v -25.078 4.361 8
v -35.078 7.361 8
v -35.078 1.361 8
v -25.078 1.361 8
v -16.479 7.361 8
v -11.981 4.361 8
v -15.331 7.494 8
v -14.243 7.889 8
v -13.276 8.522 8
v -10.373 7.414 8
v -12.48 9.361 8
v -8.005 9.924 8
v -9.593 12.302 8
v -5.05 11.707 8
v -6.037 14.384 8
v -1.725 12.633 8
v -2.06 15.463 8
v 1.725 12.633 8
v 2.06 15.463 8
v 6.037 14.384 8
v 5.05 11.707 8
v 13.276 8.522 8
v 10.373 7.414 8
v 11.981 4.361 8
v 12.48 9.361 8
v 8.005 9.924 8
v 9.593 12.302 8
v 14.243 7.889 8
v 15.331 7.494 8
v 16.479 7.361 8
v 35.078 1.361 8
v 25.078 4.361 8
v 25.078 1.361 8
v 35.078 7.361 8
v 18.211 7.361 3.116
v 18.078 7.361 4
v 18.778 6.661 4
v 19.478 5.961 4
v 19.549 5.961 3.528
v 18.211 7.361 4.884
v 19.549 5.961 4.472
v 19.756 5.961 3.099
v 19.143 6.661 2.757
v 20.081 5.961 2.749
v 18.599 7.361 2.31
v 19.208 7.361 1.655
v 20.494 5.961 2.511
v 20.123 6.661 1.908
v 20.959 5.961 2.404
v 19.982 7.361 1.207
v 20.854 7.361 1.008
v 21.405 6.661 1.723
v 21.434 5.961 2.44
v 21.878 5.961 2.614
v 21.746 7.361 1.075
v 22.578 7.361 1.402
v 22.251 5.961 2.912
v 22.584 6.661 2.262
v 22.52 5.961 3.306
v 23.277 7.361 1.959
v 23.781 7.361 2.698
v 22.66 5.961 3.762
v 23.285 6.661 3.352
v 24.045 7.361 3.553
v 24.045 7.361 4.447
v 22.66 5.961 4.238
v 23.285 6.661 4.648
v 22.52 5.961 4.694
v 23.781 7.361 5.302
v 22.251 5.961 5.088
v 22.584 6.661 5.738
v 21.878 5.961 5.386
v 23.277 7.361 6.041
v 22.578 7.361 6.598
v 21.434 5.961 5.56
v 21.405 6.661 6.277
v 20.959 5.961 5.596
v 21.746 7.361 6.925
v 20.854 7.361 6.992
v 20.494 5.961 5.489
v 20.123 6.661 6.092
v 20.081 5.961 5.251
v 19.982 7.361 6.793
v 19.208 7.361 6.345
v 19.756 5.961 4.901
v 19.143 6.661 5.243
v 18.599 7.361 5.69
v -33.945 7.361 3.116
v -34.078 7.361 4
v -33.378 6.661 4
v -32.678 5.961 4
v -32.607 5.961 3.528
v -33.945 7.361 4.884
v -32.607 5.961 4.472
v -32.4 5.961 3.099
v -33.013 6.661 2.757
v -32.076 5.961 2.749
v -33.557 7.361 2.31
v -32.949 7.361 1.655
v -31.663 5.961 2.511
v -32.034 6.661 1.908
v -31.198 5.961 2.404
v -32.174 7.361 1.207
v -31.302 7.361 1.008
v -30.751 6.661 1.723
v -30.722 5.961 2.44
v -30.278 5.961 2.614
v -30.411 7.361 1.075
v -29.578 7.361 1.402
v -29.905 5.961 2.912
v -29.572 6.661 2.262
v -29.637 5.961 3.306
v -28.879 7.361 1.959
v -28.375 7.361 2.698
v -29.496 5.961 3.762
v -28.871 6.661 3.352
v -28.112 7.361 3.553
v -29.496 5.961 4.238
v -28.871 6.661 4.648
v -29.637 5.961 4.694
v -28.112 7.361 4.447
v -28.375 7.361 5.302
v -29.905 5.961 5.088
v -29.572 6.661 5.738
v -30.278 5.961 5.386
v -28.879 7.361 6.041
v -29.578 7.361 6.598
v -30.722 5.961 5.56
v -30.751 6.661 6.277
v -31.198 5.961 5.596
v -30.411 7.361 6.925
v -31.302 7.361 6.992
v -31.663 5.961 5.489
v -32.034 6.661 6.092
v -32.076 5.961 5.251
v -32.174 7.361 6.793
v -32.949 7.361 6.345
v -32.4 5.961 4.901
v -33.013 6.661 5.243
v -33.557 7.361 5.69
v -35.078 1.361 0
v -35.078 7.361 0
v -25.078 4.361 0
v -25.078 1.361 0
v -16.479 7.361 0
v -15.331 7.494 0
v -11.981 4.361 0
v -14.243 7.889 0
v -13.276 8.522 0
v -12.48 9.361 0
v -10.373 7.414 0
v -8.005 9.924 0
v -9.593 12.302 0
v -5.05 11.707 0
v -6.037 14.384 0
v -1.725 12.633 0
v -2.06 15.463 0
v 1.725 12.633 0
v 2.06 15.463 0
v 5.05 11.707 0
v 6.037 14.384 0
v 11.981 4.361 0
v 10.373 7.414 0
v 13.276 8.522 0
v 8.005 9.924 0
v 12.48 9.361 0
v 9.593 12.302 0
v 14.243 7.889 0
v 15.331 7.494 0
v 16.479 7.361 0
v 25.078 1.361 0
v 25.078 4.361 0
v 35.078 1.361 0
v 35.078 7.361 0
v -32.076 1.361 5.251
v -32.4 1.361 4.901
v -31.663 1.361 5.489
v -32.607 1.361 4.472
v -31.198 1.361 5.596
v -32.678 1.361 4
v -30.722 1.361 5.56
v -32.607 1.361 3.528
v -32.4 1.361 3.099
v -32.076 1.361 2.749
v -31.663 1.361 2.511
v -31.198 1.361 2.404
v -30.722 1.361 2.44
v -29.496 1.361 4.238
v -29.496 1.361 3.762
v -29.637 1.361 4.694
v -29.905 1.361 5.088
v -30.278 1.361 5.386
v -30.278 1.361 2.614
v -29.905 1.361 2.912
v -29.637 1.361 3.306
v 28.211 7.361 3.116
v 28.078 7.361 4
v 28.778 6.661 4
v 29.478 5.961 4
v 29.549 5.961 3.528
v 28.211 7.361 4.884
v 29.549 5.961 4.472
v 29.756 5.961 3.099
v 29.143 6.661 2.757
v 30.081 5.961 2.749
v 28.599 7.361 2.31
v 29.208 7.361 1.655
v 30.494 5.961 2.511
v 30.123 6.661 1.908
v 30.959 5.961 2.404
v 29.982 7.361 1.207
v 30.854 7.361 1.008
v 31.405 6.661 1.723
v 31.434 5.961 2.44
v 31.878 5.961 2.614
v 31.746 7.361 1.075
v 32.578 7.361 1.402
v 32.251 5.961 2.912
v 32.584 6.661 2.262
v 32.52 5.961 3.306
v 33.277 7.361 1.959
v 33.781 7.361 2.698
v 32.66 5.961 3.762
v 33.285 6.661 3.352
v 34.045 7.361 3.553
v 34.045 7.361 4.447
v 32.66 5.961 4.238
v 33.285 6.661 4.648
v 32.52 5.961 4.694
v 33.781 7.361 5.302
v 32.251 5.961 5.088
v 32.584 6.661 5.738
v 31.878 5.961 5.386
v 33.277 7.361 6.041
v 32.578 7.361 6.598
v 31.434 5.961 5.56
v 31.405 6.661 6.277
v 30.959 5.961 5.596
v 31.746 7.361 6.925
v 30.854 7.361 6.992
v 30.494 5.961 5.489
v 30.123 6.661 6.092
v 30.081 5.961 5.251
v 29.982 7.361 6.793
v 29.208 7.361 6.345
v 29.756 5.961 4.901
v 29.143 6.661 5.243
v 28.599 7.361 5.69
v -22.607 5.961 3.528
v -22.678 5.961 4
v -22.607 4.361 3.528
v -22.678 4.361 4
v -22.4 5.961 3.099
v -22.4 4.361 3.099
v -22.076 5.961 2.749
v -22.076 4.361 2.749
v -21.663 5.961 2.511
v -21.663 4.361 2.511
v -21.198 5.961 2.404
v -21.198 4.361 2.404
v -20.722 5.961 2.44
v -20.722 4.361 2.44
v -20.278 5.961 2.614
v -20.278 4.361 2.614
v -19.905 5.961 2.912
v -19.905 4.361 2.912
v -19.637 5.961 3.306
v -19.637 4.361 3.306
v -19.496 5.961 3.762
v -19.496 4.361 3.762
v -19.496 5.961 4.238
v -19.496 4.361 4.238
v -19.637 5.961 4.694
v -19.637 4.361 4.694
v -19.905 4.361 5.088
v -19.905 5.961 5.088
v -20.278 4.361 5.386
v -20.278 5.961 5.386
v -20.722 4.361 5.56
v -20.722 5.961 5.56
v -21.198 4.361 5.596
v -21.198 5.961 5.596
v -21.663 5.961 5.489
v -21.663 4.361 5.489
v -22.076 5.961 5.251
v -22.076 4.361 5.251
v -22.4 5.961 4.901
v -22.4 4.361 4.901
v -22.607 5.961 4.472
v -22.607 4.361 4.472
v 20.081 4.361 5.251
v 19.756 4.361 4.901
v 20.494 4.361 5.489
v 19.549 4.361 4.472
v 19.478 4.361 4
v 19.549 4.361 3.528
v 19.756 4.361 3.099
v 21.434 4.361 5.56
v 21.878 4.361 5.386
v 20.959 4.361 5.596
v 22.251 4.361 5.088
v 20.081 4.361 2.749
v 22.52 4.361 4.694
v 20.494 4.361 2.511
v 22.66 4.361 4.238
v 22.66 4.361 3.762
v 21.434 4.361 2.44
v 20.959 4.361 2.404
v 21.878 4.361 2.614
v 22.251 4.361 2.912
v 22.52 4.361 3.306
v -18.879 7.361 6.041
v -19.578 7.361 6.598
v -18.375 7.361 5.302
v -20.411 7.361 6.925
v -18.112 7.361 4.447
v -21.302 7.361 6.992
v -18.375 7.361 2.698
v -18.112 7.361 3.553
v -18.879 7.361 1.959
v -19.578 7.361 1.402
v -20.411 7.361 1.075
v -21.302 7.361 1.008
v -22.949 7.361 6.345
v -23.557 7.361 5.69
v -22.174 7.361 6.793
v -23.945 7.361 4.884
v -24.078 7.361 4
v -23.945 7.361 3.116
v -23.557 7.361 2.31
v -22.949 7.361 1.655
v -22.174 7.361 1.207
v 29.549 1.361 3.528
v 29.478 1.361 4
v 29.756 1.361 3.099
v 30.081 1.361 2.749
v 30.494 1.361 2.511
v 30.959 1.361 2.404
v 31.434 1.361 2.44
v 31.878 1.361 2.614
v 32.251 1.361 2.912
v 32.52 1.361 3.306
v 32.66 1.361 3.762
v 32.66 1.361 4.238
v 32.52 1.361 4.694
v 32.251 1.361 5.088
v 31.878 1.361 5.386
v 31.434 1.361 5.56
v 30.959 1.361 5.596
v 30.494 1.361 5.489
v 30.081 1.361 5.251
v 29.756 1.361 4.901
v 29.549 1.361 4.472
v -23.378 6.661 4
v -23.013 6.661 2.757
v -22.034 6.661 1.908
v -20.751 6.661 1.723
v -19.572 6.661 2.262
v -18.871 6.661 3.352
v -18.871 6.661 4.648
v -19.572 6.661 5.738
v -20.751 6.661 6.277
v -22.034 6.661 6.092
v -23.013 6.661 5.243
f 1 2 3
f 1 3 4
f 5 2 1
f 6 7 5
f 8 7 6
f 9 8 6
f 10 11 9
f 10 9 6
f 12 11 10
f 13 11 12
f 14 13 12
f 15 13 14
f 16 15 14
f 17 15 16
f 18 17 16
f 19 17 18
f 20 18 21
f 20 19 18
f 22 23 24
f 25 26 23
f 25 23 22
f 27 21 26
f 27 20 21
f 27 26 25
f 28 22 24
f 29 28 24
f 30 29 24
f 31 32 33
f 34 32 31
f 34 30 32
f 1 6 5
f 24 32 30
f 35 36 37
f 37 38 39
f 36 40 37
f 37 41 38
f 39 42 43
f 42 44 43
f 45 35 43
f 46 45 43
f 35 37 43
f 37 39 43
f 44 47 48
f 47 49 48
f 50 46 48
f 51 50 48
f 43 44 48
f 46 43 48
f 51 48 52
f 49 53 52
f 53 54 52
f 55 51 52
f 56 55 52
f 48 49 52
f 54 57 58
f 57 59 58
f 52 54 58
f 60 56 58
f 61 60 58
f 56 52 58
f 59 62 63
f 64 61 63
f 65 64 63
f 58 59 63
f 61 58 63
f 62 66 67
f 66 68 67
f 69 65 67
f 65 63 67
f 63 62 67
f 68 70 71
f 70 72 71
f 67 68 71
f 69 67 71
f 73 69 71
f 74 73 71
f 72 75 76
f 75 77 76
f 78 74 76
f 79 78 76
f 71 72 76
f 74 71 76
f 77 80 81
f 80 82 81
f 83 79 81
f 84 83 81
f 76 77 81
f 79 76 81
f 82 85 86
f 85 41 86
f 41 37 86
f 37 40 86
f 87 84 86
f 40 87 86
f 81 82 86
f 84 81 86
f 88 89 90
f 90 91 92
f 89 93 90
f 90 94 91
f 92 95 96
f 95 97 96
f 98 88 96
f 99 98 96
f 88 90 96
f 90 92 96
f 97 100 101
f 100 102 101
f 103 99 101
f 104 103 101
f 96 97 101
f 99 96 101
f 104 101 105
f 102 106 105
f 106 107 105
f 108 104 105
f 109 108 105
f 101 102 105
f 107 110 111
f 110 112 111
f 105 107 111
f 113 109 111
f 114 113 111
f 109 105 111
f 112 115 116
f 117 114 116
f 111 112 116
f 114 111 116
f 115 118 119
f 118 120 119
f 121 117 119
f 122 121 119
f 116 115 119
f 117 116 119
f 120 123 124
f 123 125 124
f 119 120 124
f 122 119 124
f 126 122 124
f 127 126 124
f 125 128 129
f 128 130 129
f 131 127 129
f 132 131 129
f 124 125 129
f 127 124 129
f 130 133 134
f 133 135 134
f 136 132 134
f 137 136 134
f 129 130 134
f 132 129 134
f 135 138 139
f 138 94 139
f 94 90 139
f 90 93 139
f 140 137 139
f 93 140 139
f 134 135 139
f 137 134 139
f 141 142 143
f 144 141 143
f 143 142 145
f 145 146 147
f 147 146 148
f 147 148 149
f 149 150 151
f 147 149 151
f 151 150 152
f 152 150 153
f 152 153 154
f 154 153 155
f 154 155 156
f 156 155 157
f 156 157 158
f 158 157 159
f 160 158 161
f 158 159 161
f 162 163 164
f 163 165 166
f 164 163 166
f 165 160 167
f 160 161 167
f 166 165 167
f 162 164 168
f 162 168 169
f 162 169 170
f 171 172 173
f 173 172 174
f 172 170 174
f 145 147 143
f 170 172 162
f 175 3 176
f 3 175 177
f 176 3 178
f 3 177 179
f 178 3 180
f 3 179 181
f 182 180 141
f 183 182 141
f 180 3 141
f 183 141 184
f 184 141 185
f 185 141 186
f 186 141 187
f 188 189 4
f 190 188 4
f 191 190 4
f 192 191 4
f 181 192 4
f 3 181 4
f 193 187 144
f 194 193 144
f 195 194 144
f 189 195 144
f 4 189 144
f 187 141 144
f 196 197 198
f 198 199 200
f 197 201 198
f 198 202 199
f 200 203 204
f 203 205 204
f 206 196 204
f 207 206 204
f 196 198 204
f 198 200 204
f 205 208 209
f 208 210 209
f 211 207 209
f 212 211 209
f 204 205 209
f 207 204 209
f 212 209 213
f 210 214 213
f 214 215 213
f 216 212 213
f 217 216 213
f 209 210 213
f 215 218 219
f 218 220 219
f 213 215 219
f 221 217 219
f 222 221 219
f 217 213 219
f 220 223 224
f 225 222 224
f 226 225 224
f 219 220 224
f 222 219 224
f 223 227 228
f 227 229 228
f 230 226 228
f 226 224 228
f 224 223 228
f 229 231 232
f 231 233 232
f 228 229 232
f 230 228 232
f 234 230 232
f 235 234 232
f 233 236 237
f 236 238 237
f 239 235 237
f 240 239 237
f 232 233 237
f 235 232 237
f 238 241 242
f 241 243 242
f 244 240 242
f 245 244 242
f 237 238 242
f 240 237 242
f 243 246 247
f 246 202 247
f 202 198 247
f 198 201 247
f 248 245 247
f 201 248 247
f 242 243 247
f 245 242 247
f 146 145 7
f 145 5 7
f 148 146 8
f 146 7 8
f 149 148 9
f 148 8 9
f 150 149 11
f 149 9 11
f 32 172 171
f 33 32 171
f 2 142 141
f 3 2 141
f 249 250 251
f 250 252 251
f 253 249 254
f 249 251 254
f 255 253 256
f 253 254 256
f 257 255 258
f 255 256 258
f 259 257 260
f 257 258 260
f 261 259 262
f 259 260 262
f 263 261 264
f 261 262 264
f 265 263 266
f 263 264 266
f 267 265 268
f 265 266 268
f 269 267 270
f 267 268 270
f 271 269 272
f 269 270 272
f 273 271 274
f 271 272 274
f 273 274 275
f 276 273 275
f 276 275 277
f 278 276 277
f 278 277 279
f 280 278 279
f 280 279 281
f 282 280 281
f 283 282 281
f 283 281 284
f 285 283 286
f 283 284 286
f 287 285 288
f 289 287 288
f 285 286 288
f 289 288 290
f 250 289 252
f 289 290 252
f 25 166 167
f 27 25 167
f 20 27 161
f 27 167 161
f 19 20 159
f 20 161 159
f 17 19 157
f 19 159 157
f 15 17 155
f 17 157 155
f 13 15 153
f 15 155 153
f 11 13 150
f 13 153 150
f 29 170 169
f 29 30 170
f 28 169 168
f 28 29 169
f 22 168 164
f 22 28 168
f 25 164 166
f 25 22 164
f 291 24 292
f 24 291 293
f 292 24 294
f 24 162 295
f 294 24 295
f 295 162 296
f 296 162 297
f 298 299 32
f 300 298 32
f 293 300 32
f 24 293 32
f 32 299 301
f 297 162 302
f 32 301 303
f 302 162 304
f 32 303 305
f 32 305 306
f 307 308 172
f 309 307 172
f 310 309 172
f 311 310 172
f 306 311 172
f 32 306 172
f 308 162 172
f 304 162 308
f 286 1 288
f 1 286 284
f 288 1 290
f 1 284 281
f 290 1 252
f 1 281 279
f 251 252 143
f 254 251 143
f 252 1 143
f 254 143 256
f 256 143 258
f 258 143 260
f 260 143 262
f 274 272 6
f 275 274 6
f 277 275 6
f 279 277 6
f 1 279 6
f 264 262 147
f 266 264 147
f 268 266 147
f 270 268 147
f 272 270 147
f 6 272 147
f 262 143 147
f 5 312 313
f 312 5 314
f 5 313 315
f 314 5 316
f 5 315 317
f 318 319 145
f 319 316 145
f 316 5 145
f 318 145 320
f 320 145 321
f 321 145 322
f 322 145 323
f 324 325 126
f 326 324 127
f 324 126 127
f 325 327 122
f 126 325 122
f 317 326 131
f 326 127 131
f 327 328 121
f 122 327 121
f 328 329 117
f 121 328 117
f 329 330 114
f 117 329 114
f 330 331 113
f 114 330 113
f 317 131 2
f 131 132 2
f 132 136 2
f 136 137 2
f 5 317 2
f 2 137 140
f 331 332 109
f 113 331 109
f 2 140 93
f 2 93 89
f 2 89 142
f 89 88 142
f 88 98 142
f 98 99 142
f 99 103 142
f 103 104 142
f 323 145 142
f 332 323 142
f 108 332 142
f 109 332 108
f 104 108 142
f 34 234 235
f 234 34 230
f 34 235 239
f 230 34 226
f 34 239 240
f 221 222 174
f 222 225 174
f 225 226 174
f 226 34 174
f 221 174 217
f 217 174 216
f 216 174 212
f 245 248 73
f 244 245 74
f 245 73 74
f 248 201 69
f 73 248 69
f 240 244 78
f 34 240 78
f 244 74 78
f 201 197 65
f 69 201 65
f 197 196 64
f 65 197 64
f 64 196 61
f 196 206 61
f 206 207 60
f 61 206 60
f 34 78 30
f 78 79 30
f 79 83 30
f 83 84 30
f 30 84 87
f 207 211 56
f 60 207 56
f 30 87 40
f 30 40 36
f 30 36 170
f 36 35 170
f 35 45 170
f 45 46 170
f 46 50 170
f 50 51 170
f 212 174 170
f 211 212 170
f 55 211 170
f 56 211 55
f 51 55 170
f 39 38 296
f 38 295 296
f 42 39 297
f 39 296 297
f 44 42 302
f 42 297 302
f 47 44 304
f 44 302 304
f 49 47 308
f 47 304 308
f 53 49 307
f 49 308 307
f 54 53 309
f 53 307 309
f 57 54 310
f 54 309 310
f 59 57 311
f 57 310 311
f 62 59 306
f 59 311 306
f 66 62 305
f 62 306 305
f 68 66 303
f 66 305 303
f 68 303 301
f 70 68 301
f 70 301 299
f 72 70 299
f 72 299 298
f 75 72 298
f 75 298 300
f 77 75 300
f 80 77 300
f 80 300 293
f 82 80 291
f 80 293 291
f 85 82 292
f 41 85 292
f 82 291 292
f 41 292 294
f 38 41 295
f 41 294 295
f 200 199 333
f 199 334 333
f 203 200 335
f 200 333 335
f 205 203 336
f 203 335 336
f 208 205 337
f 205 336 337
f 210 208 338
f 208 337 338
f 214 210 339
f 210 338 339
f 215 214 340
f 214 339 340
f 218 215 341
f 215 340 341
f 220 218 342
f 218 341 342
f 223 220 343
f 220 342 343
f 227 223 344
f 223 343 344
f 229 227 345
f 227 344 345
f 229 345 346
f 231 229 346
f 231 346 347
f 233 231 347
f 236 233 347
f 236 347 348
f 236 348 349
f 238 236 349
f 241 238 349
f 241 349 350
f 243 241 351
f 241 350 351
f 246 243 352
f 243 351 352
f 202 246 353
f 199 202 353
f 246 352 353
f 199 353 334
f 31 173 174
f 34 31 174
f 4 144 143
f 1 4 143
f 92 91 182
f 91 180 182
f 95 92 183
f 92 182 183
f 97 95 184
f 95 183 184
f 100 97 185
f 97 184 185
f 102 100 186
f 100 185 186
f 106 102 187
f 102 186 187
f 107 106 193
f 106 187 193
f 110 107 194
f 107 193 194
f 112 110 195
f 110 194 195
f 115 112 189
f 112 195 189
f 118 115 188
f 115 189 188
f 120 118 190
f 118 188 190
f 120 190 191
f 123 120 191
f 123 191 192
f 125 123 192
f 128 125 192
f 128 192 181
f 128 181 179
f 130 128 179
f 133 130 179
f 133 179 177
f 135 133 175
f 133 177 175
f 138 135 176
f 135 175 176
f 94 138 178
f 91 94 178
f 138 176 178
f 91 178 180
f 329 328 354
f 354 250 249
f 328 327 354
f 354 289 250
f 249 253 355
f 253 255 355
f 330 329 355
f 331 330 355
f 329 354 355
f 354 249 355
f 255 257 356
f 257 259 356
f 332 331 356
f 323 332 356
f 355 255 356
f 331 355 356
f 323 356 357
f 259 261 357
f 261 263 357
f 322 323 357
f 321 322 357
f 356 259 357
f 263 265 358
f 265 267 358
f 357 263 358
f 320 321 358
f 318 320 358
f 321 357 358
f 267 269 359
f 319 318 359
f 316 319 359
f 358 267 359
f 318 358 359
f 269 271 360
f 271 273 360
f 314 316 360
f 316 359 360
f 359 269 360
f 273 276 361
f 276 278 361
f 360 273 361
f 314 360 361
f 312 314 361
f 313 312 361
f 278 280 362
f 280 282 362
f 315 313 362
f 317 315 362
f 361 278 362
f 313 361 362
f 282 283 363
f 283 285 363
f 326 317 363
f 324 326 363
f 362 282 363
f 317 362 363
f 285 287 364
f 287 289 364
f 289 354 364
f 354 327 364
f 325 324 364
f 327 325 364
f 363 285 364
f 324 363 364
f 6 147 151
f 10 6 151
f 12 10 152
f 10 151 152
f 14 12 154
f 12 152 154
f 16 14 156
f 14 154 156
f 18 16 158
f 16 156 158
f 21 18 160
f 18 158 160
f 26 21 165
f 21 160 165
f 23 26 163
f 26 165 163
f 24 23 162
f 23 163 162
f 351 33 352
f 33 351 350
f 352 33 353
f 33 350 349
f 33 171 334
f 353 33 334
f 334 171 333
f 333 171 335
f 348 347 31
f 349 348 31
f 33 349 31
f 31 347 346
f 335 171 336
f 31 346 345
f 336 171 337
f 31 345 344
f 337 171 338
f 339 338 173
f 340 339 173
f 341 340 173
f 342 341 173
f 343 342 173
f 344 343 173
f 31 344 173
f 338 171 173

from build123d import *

# Parameters (mm, degrees)
BOSS_EXTRUDE1_DEPTH = 8
HOLE1_D             = 3.2
HOLE1_CSINK_D       = 6
HOLE1_CSINK_ANGLE   = 90
FILLET1_R           = 5


with BuildPart() as part:
    # Sketch1 → Boss-Extrude1 (new body)
    with BuildSketch(Plane.XY):
        with BuildLine():
            Line((-13.754245124, 7.360756827), (-35.078110692, 7.360756827))
            Line((-35.078110692, 7.360756827), (-35.078110692, 1.360756827))
            Line((-35.078110692, 1.360756827), (-25.078110692, 1.360756827))
            Line((-25.078110692, 1.360756827), (-25.078110692, 4.360756827))
            Line((-25.078110692, 4.360756827), (-11.981080915, 4.360756827))
            ThreePointArc((-11.981080915, 4.360756827), (0, 12.75), (11.981080915, 4.360756827))
            Line((11.981080915, 4.360756827), (25.078110692, 4.360756827))
            Line((25.078110692, 4.360756827), (25.078110692, 1.360756827))
            Line((25.078110692, 1.360756827), (35.078110692, 1.360756827))
            Line((35.078110692, 1.360756827), (35.078110692, 7.360756827))
            Line((35.078110692, 7.360756827), (13.754245124, 7.360756827))
            ThreePointArc((13.754245124, 7.360756827), (0, 15.6), (-13.754245124, 7.360756827))
        make_face()
    extrude(amount=BOSS_EXTRUDE1_DEPTH)

    # Hole1 (through all)
    with Locations(Plane(origin=(-21.078110692, 7.360756827, 4), x_dir=(1, 0, 0), z_dir=(0, 1, 0))):
        with Locations((0, 0), (42.156221384, 0), (-10, 0), (52.156221384, 0)):
            CounterSinkHole(HOLE1_D / 2, HOLE1_CSINK_D / 2, counter_sink_angle=HOLE1_CSINK_ANGLE)

    # Fillet1
    fillet1_edges = [part.edges().sort_by_distance(p)[0] for p in [
        (-13.754245124, 7.360756827, 4),
        (13.754245124, 7.360756827, 4),
    ]]
    fillet(fillet1_edges, radius=FILLET1_R)


solid = part.part
